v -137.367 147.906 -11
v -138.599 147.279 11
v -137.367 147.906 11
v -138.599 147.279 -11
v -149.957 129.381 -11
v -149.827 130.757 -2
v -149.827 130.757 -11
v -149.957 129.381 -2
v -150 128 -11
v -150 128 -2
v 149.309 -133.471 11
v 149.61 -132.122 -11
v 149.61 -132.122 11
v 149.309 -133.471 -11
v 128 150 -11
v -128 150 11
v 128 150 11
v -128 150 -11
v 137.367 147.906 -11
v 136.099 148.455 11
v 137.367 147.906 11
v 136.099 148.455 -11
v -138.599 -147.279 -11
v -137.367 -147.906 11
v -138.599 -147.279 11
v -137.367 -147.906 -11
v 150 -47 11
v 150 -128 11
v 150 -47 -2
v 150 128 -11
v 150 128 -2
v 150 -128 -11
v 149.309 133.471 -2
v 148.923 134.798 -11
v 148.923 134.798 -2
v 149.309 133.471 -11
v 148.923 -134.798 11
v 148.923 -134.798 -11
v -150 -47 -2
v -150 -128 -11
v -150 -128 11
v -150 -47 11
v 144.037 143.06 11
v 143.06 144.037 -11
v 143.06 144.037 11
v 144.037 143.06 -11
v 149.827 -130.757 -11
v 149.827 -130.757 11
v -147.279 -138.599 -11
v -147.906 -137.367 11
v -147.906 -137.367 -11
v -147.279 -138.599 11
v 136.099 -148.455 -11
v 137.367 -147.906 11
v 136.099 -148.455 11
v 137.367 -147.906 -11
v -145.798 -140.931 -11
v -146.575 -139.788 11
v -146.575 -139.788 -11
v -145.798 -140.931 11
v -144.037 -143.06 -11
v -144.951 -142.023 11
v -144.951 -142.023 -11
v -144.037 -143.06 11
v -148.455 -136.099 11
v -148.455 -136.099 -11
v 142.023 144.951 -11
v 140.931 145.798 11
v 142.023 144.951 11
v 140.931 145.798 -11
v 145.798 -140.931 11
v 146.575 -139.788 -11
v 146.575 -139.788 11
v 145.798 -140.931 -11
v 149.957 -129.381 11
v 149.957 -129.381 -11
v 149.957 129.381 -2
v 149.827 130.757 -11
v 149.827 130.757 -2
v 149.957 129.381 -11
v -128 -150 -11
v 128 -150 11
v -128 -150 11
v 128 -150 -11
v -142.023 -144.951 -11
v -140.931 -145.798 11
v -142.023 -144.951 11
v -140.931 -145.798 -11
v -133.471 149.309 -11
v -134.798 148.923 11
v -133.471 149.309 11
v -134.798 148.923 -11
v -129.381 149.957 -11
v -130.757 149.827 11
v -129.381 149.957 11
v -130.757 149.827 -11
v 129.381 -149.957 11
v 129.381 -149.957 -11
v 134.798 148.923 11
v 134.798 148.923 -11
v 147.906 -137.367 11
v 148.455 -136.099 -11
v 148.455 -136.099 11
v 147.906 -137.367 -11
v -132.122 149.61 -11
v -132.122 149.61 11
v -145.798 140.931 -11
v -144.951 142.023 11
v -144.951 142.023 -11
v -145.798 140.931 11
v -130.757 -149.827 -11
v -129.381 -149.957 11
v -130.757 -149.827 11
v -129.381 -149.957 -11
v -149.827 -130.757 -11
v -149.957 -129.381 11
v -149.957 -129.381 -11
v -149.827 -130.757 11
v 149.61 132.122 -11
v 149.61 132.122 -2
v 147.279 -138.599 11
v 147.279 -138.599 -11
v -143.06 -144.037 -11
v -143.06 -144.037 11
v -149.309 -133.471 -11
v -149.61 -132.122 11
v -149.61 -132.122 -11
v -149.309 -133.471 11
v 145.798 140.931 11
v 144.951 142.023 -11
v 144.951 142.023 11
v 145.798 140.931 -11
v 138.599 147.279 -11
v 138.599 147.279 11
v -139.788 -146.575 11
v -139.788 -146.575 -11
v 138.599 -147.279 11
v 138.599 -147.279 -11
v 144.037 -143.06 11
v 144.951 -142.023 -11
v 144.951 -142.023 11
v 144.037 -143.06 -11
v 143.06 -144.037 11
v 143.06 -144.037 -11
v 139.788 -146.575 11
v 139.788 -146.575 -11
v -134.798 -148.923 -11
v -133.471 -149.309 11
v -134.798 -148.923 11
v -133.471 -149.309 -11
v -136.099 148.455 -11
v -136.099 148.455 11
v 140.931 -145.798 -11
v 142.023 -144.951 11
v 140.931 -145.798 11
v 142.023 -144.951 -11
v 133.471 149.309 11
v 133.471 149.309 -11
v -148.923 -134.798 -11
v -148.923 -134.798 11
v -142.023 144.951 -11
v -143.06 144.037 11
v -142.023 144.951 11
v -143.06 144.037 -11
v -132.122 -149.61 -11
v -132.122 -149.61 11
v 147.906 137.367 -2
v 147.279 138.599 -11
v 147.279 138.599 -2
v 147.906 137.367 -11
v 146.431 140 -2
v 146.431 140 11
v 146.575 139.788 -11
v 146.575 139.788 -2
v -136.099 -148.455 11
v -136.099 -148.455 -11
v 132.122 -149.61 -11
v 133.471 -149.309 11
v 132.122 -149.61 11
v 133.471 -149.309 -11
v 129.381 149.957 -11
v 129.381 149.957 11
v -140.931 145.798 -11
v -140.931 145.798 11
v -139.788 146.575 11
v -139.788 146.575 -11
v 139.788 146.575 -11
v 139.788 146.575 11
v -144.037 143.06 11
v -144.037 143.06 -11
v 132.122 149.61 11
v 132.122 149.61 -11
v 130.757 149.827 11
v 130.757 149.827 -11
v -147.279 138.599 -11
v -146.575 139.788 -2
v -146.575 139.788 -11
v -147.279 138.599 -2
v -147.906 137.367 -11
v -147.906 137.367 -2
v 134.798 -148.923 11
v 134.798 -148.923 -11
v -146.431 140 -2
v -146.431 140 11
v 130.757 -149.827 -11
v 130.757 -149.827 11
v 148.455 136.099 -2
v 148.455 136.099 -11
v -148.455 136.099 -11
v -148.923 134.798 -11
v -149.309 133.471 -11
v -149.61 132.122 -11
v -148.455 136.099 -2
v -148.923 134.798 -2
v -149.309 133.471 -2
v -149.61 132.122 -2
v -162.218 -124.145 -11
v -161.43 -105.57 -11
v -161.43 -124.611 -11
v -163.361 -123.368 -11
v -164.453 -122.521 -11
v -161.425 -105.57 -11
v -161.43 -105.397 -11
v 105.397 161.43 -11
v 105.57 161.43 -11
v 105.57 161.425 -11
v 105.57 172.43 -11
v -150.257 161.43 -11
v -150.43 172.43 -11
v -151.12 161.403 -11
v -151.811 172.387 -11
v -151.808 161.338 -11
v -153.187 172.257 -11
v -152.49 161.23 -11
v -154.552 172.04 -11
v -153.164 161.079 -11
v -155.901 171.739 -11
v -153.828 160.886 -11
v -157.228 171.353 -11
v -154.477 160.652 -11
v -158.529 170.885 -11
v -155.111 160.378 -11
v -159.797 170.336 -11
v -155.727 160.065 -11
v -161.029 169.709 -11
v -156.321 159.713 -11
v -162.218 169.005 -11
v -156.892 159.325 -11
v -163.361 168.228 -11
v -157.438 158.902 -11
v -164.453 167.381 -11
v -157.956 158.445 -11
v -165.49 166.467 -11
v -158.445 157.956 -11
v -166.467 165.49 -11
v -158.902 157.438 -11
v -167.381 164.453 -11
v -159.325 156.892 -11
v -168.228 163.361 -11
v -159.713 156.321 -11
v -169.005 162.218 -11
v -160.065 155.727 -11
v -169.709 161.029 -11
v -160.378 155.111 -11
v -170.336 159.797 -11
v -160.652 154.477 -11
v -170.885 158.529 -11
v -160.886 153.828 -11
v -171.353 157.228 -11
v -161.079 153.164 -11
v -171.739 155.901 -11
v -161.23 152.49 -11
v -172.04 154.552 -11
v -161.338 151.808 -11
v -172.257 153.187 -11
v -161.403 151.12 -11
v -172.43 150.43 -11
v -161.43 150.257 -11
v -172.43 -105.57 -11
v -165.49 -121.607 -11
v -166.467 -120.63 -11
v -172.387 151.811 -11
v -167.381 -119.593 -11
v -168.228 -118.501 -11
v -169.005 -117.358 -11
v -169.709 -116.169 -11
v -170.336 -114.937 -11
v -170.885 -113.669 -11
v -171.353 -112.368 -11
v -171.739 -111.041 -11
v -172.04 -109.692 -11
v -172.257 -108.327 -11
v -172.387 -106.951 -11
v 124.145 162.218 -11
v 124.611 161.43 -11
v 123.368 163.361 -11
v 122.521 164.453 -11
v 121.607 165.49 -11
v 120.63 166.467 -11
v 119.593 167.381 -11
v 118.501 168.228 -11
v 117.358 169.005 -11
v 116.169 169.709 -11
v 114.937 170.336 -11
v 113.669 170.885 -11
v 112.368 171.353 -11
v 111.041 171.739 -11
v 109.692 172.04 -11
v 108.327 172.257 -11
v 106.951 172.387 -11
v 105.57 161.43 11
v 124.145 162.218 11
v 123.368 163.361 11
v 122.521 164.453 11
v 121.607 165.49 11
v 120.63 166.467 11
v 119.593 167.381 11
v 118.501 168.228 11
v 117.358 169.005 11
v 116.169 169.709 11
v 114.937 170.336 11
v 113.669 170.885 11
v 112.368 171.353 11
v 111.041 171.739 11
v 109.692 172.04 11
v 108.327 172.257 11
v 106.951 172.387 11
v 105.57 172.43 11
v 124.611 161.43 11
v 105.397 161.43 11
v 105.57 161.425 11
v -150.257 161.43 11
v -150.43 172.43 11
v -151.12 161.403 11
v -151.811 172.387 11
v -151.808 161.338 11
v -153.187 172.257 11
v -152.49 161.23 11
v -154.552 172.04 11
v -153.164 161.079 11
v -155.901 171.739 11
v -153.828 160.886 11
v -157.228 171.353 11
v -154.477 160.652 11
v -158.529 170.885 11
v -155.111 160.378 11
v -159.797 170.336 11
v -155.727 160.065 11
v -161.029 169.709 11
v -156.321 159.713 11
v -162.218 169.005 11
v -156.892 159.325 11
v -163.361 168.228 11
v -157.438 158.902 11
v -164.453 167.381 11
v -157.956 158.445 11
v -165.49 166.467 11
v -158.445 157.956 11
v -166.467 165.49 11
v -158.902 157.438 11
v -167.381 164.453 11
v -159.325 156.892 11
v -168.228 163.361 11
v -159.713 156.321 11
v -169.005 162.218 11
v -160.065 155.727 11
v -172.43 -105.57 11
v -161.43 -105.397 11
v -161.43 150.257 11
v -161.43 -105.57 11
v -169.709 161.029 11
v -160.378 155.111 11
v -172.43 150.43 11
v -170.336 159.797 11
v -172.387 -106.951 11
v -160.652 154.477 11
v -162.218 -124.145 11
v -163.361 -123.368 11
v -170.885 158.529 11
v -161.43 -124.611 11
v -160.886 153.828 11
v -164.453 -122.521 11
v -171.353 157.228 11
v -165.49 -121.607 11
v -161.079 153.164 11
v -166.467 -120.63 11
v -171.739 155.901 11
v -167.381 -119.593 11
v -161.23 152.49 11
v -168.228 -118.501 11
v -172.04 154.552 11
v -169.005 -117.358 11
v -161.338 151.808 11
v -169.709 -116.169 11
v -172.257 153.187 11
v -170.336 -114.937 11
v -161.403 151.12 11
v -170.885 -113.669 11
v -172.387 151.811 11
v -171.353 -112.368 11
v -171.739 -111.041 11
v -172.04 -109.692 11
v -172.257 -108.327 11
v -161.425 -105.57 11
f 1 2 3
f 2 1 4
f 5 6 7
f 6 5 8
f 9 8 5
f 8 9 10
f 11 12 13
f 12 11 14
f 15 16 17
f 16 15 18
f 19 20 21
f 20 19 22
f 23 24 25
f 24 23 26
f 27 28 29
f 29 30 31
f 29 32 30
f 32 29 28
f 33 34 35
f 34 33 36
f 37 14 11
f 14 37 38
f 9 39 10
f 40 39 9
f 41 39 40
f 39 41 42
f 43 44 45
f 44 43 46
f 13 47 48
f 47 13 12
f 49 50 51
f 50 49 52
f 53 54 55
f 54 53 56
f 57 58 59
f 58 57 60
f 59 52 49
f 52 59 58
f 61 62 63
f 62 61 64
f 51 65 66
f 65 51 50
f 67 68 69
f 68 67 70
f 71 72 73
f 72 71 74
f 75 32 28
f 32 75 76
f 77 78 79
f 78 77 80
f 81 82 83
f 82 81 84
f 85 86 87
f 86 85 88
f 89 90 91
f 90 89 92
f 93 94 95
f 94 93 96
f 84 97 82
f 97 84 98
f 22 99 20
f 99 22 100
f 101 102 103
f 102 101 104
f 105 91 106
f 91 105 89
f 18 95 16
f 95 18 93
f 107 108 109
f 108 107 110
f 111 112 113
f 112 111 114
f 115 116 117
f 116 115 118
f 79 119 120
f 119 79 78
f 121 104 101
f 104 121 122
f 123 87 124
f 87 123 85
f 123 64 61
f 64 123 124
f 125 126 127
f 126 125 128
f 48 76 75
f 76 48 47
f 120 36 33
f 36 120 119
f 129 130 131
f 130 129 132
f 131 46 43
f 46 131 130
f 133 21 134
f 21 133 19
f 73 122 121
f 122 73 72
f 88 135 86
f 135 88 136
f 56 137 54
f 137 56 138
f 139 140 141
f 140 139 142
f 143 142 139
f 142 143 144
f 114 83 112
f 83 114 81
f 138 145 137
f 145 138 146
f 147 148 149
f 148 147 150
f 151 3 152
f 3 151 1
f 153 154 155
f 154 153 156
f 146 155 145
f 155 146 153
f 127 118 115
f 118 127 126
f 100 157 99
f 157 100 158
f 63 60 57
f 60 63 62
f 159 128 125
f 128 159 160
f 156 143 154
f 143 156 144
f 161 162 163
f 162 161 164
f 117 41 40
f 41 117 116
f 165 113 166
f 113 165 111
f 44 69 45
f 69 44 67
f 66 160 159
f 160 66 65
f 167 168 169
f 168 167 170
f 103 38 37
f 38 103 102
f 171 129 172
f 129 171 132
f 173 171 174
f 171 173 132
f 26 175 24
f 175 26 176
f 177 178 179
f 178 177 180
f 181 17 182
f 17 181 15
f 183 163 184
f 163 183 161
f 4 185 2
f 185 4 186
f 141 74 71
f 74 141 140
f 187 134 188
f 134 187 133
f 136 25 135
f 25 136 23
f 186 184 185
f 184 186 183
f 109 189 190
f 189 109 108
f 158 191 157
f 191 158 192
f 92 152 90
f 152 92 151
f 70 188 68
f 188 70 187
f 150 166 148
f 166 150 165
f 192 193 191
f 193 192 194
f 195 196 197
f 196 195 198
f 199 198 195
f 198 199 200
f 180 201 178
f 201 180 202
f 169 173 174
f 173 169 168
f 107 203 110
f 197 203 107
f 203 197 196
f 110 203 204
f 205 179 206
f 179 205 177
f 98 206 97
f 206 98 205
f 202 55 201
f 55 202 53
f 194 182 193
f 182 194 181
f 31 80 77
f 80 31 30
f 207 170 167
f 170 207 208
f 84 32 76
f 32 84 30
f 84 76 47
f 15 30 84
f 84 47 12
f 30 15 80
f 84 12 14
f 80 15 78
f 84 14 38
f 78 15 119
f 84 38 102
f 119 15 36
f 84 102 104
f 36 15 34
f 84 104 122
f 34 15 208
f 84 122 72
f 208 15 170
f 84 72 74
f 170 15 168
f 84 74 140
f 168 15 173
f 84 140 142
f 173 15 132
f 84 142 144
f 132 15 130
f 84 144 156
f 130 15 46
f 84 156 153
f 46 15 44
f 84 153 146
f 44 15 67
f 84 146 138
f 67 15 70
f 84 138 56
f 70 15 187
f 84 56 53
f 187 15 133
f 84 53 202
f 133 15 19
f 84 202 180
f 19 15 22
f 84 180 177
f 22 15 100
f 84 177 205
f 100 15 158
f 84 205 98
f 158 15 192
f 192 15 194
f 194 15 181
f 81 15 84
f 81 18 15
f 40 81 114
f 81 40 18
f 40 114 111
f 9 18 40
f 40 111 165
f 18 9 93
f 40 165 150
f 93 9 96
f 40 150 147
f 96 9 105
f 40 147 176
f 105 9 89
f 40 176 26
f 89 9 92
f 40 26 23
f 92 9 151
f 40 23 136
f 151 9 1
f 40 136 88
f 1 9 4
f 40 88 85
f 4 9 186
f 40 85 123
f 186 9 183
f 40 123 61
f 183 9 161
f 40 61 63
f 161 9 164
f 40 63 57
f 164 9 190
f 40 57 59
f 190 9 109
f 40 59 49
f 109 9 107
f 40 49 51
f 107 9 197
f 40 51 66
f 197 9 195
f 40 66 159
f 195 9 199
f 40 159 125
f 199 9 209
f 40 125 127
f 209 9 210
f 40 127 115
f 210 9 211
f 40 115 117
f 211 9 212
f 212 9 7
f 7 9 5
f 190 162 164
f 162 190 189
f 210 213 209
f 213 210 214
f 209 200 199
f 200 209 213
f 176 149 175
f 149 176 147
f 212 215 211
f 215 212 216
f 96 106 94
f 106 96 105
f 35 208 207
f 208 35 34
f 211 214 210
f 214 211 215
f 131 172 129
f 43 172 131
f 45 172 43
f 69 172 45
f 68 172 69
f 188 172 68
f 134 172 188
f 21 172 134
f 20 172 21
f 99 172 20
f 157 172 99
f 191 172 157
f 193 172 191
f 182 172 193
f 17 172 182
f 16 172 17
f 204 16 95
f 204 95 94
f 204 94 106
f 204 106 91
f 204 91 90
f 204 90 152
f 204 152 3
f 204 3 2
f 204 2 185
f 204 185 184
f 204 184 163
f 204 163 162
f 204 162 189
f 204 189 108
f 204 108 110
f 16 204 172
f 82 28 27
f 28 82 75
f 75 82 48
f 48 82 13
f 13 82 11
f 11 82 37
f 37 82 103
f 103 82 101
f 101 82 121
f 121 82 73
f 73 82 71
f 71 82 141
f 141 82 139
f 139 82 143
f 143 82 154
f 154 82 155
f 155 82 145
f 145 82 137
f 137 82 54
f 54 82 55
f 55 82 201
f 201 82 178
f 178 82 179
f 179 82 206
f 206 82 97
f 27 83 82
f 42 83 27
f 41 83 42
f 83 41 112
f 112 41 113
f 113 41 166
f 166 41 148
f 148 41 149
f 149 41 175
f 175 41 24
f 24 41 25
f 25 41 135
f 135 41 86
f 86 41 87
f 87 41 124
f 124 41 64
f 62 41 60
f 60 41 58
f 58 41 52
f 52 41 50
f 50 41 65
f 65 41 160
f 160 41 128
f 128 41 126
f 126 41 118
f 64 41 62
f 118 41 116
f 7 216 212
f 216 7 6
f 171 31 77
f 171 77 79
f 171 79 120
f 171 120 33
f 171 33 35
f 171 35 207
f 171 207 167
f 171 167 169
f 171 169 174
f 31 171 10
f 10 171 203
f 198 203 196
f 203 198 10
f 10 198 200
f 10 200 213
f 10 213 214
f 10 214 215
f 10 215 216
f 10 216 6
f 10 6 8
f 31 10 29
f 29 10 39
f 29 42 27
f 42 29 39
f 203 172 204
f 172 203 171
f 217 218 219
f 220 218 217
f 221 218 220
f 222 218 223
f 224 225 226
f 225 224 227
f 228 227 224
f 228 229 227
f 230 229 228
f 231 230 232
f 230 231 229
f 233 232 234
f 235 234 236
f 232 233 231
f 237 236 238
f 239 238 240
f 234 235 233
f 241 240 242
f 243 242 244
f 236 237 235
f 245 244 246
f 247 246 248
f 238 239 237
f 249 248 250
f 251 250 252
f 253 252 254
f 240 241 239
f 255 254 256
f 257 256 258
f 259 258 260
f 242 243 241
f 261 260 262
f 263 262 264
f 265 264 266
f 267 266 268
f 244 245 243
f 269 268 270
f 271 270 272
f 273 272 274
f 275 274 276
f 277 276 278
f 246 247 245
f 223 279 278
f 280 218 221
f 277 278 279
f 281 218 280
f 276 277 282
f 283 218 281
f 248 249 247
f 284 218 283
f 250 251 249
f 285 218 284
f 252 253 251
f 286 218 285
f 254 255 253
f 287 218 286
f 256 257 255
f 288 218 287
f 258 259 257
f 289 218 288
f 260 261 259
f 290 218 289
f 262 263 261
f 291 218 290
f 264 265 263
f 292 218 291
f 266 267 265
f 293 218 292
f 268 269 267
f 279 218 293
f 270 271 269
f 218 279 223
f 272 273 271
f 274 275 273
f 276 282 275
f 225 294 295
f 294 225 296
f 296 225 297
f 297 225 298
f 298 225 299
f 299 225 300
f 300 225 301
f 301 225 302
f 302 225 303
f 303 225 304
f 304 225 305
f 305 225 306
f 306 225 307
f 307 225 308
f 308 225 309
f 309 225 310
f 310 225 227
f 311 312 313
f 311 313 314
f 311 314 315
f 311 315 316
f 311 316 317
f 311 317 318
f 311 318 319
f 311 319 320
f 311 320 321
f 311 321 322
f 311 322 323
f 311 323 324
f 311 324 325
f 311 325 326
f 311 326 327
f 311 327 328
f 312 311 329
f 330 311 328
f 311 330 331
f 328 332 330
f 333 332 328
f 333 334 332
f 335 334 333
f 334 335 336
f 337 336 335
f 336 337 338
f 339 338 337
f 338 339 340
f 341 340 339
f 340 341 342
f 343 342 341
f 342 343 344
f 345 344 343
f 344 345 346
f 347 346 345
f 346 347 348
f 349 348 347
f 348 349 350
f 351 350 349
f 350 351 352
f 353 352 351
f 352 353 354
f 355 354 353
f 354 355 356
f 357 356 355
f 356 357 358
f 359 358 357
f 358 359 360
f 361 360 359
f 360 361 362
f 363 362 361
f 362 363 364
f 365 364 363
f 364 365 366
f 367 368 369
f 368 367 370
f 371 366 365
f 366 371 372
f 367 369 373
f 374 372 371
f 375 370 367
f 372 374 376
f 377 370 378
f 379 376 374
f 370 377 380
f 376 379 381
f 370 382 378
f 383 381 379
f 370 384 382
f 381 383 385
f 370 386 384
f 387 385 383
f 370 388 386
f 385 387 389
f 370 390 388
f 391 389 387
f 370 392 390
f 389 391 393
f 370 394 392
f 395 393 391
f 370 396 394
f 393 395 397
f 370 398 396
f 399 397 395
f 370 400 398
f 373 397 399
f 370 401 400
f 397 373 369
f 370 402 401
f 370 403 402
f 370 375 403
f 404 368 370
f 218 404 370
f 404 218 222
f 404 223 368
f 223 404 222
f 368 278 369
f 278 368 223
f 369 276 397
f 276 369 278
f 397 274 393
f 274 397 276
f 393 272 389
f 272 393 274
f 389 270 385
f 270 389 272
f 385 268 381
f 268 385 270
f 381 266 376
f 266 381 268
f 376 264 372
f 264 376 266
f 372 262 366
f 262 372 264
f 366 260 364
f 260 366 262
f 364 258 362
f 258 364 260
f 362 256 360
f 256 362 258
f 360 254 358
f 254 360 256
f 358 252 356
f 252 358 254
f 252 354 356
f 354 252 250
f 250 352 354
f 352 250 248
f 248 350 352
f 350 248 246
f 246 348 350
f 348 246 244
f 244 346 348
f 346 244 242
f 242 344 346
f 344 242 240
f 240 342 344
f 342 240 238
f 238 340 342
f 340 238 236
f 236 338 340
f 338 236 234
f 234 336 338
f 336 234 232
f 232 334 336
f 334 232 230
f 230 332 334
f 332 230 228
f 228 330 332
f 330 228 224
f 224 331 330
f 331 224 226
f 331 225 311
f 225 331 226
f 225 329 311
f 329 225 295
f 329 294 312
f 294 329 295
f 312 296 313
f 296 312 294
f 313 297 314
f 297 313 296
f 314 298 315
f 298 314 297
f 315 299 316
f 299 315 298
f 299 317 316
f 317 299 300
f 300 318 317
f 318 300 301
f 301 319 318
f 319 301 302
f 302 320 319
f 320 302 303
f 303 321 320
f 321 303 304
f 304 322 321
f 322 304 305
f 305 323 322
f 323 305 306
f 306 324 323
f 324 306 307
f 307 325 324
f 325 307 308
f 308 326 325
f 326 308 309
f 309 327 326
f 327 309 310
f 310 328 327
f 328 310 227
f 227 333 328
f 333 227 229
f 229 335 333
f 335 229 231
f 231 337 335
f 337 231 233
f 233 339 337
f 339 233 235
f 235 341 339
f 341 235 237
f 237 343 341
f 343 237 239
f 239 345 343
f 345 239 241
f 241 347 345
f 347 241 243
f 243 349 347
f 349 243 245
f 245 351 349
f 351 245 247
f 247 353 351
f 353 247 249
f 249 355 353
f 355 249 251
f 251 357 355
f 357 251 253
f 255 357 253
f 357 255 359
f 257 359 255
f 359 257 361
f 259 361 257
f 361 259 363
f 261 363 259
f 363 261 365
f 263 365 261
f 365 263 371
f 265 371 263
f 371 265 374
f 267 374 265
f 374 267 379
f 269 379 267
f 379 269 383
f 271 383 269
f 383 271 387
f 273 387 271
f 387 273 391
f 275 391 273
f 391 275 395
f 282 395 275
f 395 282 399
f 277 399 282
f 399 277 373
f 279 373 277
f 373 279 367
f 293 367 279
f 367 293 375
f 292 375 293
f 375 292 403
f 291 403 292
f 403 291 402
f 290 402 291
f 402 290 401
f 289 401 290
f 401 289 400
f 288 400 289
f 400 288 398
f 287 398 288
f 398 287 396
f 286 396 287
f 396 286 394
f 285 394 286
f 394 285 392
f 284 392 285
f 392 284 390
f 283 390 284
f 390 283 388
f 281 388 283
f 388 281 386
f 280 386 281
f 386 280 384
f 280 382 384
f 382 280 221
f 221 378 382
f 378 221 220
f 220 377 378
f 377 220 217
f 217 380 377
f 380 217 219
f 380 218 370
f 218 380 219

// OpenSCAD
// file: ../extensions/rounded_cube.scad
use <rounded_square.scad>

// Extrude version of rounded square
//
// It does not round in Z dimension. That's because my most
// common use is really an extruded rounded square than a
// fully rounded cube.
module rounded_cube(dimensions, radius = 1, center=false) {
  linear_extrude(dimensions.z, center=center)
    rounded_square(dimensions, radius, center=center);
}
// file: ../extensions/rounded_square.scad
// Square with rounded borders
//
// If the border radius is a single number, all borders will have the
// same radius. Optionally, it can be a list with a radius for each
// corner (starting from bottom left and counting clockwise).
//
// If any radius is zero, that corner will be sharp.
module rounded_square(dimensions, radius = 1, center=false) {
  r = is_list(radius) ? radius : [radius, radius, radius, radius];

  translation = center ? -dimensions / 2 : [0, 0];

  translate(translation) {
    hull() {
      if (r[0] > 0)
        translate([r[0], r[0]]) circle(r[0]);
      else
        square(1);

      if (r[1] > 0)
        translate([r[1], dimensions.y - r[1]]) circle(r[1]);
      else
        translate([0, dimensions.y - 1]) square(1);

      if (r[2] > 0)
        translate([dimensions.x - r[2], dimensions.y - r[2]]) circle(r[2]);
      else
        translate([dimensions.x - 1, dimensions.y - 1]) square(1);

      if (r[3] > 0)
        translate([dimensions.x - r[3], r[3]]) circle(r[3]);
      else
        translate([dimensions.x - 1, 0]) square(1);
    }
  }
}
// file: ../extensions/mirror_translate.scad
// Mirrors the object translation
module mirror_translate(translation, copy=true) {
  if (copy) translate(translation) children();
  // mirror only what we moved
  m = [for (e = translation) e != 0 ? 1 : 0];
  mirror(m) translate(translation) children();
}
// main file
use <../extensions/mirror_translate.scad>
use <../extensions/rounded_square.scad>
use <../extensions/rounded_cube.scad>

$fn = 100;
INCH = 25.4;
bit_diameter = 1/4 * INCH;

thickness = 22;
width = 300;
depth = 300;
rounded_corner_radius = thickness;
border_distance = 10;

fence_height = thickness;
fence_thickness = thickness / 2;
gap_depth = 187;
gap_height = 13;

module base_slab() {
  rounded_cube([width, depth, thickness], rounded_corner_radius, center=true);
}

module base_gap() {
 translate([0, -depth / 2 + gap_depth / 2 + border_distance, -thickness + gap_height])
   cube([width + 1, gap_depth, thickness], center= true);
}

module base () {
  difference() {
    base_slab();
    base_gap();
  }
}

module fence() {
  linear_extrude(fence_height, center=true) {
    difference() {
      rounded_square([width, depth], rounded_corner_radius, center=true);
      offset(-fence_thickness) rounded_square([width, depth], rounded_corner_radius, center=true);
      translate([fence_thickness, -depth / 2]) square([width, thickness * 2], center=true);
      translate([width / 2, -fence_thickness]) square([thickness * 2, depth], center=true);
    }
  }
}

module assembled() {
  base();
  translate([0, 0, thickness]) fence();
}

module flat_pack() {
  rotate([180, 0, 0]) base();
  translate([-(fence_thickness + 1.8 * bit_diameter), fence_thickness + 1.8 * bit_diameter, 0]) fence();
}

assembled();
!flat_pack();
